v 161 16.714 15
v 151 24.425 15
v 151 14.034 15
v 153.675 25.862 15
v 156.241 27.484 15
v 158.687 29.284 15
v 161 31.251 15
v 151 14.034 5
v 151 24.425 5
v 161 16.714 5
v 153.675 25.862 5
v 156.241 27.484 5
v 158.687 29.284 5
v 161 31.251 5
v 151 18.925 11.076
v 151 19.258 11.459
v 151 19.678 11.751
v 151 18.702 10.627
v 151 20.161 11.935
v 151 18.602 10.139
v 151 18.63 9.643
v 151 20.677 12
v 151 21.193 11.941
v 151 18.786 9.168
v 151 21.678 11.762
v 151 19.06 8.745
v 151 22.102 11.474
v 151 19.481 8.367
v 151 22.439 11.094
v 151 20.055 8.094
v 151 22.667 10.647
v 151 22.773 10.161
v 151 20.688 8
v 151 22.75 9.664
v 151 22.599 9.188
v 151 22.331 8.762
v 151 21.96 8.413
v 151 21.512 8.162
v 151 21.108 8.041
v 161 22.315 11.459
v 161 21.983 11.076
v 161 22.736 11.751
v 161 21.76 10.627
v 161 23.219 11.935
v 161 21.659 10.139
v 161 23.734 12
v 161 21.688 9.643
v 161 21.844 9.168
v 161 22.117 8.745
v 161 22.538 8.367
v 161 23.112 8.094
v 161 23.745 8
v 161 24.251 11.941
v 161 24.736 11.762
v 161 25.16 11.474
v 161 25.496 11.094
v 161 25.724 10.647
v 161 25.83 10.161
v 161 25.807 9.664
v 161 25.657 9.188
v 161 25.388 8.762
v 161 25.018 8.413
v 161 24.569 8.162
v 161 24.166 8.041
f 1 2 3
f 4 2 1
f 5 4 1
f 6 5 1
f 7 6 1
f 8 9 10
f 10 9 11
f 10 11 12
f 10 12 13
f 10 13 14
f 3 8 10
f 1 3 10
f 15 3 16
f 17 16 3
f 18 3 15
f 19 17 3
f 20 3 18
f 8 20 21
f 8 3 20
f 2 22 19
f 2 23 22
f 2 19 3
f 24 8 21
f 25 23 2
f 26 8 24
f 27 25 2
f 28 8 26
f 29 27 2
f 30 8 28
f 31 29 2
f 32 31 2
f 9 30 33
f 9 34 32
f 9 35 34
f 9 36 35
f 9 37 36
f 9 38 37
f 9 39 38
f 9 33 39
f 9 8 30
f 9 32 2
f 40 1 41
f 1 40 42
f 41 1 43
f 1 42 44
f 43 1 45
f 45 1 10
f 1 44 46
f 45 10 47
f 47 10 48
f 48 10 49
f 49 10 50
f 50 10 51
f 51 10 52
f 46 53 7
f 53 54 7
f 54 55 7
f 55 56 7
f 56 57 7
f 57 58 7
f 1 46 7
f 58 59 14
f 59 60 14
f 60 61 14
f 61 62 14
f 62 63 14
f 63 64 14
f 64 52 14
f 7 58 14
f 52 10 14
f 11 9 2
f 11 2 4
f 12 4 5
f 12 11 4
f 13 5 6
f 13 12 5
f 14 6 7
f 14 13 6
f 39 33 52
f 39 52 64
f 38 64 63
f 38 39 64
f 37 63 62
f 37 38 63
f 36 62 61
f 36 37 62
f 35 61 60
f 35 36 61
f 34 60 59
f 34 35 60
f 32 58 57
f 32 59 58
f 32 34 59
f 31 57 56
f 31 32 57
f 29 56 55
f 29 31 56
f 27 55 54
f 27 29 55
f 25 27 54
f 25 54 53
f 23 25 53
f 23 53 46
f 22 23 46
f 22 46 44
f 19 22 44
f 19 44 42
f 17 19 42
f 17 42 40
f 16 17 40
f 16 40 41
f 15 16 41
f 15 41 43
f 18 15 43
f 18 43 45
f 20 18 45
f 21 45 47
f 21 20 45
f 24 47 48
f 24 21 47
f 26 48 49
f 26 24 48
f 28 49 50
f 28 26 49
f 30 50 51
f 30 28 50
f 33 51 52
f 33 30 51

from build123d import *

# Parameters (mm, degrees)
CYLINDER018_R               = 2
CYLINDER018_DEPTH           = 18
CYLINDER018_PITCH_ANGLE     = 90
CYLINDER018_PLACEMENT_ANGLE = 17
BOX022_W                    = 65
BOX022_H                    = 11
BOX022_DEPTH                = 20
BOX022_PLACEMENT_ANGLE      = 15
CYLINDER017_R               = 43
CYLINDER017_DEPTH           = 19
BOX020_W                    = 10
BOX020_H                    = 21
BOX020_DEPTH                = 10


with BuildPart() as cylinder018:
    # Cylinder018 → Cylinder018 (new body)
    with BuildSketch(Plane.XY):
        Circle(CYLINDER018_R)
    extrude(amount=CYLINDER018_DEPTH)


with BuildPart() as cylinder018_1:
    # Cylinder018 pitch: moved
    add(cylinder018.part.rotate(Axis((0, 0, 0), (0, 1, 0)), CYLINDER018_PITCH_ANGLE))


with BuildPart() as cylinder018_2:
    # Cylinder018 placement: moved
    add(cylinder018_1.part.moved(Location((146.075979, 19.182766, 10))).rotate(Axis((146.075979, 19.182766, 10), (0, 0, 1)), CYLINDER018_PLACEMENT_ANGLE))


with BuildPart() as cube022:
    # Box022 → Box022 (new body)
    with BuildSketch(Plane.XY):
        with Locations((32.5, 5.5)):
            Rectangle(BOX022_W, BOX022_H)
    extrude(amount=BOX022_DEPTH)


with BuildPart() as cube022_1:
    # Box022 placement: moved
    add(cube022.part.moved(Location((115, -7, 0))).rotate(Axis((115, -7, 0), (0, 0, 1)), BOX022_PLACEMENT_ANGLE))


with BuildPart() as cylinder017:
    # Cylinder017 → Cylinder017 (new body)
    with BuildSketch(Plane(origin=(132, 63, 0), x_dir=(1, 0, 0), z_dir=(0, 0, 1))):
        Circle(CYLINDER017_R)
    extrude(amount=CYLINDER017_DEPTH)


with BuildPart() as cut028:
    # Box020 → Box020 (new body)
    with BuildSketch(Plane(origin=(151, 12, 5), x_dir=(1, 0, 0), z_dir=(0, 0, 1))):
        with Locations((5, 10.5)):
            Rectangle(BOX020_W, BOX020_H)
    extrude(amount=BOX020_DEPTH)

    # Cut026: cut Cylinder017
    add(cylinder017.part, mode=Mode.SUBTRACT)

    # Cut027: cut Cube022
    add(cube022_1.part, mode=Mode.SUBTRACT)

    # Cut028: cut Cylinder018
    add(cylinder018_2.part, mode=Mode.SUBTRACT)


solid = cut028.part
